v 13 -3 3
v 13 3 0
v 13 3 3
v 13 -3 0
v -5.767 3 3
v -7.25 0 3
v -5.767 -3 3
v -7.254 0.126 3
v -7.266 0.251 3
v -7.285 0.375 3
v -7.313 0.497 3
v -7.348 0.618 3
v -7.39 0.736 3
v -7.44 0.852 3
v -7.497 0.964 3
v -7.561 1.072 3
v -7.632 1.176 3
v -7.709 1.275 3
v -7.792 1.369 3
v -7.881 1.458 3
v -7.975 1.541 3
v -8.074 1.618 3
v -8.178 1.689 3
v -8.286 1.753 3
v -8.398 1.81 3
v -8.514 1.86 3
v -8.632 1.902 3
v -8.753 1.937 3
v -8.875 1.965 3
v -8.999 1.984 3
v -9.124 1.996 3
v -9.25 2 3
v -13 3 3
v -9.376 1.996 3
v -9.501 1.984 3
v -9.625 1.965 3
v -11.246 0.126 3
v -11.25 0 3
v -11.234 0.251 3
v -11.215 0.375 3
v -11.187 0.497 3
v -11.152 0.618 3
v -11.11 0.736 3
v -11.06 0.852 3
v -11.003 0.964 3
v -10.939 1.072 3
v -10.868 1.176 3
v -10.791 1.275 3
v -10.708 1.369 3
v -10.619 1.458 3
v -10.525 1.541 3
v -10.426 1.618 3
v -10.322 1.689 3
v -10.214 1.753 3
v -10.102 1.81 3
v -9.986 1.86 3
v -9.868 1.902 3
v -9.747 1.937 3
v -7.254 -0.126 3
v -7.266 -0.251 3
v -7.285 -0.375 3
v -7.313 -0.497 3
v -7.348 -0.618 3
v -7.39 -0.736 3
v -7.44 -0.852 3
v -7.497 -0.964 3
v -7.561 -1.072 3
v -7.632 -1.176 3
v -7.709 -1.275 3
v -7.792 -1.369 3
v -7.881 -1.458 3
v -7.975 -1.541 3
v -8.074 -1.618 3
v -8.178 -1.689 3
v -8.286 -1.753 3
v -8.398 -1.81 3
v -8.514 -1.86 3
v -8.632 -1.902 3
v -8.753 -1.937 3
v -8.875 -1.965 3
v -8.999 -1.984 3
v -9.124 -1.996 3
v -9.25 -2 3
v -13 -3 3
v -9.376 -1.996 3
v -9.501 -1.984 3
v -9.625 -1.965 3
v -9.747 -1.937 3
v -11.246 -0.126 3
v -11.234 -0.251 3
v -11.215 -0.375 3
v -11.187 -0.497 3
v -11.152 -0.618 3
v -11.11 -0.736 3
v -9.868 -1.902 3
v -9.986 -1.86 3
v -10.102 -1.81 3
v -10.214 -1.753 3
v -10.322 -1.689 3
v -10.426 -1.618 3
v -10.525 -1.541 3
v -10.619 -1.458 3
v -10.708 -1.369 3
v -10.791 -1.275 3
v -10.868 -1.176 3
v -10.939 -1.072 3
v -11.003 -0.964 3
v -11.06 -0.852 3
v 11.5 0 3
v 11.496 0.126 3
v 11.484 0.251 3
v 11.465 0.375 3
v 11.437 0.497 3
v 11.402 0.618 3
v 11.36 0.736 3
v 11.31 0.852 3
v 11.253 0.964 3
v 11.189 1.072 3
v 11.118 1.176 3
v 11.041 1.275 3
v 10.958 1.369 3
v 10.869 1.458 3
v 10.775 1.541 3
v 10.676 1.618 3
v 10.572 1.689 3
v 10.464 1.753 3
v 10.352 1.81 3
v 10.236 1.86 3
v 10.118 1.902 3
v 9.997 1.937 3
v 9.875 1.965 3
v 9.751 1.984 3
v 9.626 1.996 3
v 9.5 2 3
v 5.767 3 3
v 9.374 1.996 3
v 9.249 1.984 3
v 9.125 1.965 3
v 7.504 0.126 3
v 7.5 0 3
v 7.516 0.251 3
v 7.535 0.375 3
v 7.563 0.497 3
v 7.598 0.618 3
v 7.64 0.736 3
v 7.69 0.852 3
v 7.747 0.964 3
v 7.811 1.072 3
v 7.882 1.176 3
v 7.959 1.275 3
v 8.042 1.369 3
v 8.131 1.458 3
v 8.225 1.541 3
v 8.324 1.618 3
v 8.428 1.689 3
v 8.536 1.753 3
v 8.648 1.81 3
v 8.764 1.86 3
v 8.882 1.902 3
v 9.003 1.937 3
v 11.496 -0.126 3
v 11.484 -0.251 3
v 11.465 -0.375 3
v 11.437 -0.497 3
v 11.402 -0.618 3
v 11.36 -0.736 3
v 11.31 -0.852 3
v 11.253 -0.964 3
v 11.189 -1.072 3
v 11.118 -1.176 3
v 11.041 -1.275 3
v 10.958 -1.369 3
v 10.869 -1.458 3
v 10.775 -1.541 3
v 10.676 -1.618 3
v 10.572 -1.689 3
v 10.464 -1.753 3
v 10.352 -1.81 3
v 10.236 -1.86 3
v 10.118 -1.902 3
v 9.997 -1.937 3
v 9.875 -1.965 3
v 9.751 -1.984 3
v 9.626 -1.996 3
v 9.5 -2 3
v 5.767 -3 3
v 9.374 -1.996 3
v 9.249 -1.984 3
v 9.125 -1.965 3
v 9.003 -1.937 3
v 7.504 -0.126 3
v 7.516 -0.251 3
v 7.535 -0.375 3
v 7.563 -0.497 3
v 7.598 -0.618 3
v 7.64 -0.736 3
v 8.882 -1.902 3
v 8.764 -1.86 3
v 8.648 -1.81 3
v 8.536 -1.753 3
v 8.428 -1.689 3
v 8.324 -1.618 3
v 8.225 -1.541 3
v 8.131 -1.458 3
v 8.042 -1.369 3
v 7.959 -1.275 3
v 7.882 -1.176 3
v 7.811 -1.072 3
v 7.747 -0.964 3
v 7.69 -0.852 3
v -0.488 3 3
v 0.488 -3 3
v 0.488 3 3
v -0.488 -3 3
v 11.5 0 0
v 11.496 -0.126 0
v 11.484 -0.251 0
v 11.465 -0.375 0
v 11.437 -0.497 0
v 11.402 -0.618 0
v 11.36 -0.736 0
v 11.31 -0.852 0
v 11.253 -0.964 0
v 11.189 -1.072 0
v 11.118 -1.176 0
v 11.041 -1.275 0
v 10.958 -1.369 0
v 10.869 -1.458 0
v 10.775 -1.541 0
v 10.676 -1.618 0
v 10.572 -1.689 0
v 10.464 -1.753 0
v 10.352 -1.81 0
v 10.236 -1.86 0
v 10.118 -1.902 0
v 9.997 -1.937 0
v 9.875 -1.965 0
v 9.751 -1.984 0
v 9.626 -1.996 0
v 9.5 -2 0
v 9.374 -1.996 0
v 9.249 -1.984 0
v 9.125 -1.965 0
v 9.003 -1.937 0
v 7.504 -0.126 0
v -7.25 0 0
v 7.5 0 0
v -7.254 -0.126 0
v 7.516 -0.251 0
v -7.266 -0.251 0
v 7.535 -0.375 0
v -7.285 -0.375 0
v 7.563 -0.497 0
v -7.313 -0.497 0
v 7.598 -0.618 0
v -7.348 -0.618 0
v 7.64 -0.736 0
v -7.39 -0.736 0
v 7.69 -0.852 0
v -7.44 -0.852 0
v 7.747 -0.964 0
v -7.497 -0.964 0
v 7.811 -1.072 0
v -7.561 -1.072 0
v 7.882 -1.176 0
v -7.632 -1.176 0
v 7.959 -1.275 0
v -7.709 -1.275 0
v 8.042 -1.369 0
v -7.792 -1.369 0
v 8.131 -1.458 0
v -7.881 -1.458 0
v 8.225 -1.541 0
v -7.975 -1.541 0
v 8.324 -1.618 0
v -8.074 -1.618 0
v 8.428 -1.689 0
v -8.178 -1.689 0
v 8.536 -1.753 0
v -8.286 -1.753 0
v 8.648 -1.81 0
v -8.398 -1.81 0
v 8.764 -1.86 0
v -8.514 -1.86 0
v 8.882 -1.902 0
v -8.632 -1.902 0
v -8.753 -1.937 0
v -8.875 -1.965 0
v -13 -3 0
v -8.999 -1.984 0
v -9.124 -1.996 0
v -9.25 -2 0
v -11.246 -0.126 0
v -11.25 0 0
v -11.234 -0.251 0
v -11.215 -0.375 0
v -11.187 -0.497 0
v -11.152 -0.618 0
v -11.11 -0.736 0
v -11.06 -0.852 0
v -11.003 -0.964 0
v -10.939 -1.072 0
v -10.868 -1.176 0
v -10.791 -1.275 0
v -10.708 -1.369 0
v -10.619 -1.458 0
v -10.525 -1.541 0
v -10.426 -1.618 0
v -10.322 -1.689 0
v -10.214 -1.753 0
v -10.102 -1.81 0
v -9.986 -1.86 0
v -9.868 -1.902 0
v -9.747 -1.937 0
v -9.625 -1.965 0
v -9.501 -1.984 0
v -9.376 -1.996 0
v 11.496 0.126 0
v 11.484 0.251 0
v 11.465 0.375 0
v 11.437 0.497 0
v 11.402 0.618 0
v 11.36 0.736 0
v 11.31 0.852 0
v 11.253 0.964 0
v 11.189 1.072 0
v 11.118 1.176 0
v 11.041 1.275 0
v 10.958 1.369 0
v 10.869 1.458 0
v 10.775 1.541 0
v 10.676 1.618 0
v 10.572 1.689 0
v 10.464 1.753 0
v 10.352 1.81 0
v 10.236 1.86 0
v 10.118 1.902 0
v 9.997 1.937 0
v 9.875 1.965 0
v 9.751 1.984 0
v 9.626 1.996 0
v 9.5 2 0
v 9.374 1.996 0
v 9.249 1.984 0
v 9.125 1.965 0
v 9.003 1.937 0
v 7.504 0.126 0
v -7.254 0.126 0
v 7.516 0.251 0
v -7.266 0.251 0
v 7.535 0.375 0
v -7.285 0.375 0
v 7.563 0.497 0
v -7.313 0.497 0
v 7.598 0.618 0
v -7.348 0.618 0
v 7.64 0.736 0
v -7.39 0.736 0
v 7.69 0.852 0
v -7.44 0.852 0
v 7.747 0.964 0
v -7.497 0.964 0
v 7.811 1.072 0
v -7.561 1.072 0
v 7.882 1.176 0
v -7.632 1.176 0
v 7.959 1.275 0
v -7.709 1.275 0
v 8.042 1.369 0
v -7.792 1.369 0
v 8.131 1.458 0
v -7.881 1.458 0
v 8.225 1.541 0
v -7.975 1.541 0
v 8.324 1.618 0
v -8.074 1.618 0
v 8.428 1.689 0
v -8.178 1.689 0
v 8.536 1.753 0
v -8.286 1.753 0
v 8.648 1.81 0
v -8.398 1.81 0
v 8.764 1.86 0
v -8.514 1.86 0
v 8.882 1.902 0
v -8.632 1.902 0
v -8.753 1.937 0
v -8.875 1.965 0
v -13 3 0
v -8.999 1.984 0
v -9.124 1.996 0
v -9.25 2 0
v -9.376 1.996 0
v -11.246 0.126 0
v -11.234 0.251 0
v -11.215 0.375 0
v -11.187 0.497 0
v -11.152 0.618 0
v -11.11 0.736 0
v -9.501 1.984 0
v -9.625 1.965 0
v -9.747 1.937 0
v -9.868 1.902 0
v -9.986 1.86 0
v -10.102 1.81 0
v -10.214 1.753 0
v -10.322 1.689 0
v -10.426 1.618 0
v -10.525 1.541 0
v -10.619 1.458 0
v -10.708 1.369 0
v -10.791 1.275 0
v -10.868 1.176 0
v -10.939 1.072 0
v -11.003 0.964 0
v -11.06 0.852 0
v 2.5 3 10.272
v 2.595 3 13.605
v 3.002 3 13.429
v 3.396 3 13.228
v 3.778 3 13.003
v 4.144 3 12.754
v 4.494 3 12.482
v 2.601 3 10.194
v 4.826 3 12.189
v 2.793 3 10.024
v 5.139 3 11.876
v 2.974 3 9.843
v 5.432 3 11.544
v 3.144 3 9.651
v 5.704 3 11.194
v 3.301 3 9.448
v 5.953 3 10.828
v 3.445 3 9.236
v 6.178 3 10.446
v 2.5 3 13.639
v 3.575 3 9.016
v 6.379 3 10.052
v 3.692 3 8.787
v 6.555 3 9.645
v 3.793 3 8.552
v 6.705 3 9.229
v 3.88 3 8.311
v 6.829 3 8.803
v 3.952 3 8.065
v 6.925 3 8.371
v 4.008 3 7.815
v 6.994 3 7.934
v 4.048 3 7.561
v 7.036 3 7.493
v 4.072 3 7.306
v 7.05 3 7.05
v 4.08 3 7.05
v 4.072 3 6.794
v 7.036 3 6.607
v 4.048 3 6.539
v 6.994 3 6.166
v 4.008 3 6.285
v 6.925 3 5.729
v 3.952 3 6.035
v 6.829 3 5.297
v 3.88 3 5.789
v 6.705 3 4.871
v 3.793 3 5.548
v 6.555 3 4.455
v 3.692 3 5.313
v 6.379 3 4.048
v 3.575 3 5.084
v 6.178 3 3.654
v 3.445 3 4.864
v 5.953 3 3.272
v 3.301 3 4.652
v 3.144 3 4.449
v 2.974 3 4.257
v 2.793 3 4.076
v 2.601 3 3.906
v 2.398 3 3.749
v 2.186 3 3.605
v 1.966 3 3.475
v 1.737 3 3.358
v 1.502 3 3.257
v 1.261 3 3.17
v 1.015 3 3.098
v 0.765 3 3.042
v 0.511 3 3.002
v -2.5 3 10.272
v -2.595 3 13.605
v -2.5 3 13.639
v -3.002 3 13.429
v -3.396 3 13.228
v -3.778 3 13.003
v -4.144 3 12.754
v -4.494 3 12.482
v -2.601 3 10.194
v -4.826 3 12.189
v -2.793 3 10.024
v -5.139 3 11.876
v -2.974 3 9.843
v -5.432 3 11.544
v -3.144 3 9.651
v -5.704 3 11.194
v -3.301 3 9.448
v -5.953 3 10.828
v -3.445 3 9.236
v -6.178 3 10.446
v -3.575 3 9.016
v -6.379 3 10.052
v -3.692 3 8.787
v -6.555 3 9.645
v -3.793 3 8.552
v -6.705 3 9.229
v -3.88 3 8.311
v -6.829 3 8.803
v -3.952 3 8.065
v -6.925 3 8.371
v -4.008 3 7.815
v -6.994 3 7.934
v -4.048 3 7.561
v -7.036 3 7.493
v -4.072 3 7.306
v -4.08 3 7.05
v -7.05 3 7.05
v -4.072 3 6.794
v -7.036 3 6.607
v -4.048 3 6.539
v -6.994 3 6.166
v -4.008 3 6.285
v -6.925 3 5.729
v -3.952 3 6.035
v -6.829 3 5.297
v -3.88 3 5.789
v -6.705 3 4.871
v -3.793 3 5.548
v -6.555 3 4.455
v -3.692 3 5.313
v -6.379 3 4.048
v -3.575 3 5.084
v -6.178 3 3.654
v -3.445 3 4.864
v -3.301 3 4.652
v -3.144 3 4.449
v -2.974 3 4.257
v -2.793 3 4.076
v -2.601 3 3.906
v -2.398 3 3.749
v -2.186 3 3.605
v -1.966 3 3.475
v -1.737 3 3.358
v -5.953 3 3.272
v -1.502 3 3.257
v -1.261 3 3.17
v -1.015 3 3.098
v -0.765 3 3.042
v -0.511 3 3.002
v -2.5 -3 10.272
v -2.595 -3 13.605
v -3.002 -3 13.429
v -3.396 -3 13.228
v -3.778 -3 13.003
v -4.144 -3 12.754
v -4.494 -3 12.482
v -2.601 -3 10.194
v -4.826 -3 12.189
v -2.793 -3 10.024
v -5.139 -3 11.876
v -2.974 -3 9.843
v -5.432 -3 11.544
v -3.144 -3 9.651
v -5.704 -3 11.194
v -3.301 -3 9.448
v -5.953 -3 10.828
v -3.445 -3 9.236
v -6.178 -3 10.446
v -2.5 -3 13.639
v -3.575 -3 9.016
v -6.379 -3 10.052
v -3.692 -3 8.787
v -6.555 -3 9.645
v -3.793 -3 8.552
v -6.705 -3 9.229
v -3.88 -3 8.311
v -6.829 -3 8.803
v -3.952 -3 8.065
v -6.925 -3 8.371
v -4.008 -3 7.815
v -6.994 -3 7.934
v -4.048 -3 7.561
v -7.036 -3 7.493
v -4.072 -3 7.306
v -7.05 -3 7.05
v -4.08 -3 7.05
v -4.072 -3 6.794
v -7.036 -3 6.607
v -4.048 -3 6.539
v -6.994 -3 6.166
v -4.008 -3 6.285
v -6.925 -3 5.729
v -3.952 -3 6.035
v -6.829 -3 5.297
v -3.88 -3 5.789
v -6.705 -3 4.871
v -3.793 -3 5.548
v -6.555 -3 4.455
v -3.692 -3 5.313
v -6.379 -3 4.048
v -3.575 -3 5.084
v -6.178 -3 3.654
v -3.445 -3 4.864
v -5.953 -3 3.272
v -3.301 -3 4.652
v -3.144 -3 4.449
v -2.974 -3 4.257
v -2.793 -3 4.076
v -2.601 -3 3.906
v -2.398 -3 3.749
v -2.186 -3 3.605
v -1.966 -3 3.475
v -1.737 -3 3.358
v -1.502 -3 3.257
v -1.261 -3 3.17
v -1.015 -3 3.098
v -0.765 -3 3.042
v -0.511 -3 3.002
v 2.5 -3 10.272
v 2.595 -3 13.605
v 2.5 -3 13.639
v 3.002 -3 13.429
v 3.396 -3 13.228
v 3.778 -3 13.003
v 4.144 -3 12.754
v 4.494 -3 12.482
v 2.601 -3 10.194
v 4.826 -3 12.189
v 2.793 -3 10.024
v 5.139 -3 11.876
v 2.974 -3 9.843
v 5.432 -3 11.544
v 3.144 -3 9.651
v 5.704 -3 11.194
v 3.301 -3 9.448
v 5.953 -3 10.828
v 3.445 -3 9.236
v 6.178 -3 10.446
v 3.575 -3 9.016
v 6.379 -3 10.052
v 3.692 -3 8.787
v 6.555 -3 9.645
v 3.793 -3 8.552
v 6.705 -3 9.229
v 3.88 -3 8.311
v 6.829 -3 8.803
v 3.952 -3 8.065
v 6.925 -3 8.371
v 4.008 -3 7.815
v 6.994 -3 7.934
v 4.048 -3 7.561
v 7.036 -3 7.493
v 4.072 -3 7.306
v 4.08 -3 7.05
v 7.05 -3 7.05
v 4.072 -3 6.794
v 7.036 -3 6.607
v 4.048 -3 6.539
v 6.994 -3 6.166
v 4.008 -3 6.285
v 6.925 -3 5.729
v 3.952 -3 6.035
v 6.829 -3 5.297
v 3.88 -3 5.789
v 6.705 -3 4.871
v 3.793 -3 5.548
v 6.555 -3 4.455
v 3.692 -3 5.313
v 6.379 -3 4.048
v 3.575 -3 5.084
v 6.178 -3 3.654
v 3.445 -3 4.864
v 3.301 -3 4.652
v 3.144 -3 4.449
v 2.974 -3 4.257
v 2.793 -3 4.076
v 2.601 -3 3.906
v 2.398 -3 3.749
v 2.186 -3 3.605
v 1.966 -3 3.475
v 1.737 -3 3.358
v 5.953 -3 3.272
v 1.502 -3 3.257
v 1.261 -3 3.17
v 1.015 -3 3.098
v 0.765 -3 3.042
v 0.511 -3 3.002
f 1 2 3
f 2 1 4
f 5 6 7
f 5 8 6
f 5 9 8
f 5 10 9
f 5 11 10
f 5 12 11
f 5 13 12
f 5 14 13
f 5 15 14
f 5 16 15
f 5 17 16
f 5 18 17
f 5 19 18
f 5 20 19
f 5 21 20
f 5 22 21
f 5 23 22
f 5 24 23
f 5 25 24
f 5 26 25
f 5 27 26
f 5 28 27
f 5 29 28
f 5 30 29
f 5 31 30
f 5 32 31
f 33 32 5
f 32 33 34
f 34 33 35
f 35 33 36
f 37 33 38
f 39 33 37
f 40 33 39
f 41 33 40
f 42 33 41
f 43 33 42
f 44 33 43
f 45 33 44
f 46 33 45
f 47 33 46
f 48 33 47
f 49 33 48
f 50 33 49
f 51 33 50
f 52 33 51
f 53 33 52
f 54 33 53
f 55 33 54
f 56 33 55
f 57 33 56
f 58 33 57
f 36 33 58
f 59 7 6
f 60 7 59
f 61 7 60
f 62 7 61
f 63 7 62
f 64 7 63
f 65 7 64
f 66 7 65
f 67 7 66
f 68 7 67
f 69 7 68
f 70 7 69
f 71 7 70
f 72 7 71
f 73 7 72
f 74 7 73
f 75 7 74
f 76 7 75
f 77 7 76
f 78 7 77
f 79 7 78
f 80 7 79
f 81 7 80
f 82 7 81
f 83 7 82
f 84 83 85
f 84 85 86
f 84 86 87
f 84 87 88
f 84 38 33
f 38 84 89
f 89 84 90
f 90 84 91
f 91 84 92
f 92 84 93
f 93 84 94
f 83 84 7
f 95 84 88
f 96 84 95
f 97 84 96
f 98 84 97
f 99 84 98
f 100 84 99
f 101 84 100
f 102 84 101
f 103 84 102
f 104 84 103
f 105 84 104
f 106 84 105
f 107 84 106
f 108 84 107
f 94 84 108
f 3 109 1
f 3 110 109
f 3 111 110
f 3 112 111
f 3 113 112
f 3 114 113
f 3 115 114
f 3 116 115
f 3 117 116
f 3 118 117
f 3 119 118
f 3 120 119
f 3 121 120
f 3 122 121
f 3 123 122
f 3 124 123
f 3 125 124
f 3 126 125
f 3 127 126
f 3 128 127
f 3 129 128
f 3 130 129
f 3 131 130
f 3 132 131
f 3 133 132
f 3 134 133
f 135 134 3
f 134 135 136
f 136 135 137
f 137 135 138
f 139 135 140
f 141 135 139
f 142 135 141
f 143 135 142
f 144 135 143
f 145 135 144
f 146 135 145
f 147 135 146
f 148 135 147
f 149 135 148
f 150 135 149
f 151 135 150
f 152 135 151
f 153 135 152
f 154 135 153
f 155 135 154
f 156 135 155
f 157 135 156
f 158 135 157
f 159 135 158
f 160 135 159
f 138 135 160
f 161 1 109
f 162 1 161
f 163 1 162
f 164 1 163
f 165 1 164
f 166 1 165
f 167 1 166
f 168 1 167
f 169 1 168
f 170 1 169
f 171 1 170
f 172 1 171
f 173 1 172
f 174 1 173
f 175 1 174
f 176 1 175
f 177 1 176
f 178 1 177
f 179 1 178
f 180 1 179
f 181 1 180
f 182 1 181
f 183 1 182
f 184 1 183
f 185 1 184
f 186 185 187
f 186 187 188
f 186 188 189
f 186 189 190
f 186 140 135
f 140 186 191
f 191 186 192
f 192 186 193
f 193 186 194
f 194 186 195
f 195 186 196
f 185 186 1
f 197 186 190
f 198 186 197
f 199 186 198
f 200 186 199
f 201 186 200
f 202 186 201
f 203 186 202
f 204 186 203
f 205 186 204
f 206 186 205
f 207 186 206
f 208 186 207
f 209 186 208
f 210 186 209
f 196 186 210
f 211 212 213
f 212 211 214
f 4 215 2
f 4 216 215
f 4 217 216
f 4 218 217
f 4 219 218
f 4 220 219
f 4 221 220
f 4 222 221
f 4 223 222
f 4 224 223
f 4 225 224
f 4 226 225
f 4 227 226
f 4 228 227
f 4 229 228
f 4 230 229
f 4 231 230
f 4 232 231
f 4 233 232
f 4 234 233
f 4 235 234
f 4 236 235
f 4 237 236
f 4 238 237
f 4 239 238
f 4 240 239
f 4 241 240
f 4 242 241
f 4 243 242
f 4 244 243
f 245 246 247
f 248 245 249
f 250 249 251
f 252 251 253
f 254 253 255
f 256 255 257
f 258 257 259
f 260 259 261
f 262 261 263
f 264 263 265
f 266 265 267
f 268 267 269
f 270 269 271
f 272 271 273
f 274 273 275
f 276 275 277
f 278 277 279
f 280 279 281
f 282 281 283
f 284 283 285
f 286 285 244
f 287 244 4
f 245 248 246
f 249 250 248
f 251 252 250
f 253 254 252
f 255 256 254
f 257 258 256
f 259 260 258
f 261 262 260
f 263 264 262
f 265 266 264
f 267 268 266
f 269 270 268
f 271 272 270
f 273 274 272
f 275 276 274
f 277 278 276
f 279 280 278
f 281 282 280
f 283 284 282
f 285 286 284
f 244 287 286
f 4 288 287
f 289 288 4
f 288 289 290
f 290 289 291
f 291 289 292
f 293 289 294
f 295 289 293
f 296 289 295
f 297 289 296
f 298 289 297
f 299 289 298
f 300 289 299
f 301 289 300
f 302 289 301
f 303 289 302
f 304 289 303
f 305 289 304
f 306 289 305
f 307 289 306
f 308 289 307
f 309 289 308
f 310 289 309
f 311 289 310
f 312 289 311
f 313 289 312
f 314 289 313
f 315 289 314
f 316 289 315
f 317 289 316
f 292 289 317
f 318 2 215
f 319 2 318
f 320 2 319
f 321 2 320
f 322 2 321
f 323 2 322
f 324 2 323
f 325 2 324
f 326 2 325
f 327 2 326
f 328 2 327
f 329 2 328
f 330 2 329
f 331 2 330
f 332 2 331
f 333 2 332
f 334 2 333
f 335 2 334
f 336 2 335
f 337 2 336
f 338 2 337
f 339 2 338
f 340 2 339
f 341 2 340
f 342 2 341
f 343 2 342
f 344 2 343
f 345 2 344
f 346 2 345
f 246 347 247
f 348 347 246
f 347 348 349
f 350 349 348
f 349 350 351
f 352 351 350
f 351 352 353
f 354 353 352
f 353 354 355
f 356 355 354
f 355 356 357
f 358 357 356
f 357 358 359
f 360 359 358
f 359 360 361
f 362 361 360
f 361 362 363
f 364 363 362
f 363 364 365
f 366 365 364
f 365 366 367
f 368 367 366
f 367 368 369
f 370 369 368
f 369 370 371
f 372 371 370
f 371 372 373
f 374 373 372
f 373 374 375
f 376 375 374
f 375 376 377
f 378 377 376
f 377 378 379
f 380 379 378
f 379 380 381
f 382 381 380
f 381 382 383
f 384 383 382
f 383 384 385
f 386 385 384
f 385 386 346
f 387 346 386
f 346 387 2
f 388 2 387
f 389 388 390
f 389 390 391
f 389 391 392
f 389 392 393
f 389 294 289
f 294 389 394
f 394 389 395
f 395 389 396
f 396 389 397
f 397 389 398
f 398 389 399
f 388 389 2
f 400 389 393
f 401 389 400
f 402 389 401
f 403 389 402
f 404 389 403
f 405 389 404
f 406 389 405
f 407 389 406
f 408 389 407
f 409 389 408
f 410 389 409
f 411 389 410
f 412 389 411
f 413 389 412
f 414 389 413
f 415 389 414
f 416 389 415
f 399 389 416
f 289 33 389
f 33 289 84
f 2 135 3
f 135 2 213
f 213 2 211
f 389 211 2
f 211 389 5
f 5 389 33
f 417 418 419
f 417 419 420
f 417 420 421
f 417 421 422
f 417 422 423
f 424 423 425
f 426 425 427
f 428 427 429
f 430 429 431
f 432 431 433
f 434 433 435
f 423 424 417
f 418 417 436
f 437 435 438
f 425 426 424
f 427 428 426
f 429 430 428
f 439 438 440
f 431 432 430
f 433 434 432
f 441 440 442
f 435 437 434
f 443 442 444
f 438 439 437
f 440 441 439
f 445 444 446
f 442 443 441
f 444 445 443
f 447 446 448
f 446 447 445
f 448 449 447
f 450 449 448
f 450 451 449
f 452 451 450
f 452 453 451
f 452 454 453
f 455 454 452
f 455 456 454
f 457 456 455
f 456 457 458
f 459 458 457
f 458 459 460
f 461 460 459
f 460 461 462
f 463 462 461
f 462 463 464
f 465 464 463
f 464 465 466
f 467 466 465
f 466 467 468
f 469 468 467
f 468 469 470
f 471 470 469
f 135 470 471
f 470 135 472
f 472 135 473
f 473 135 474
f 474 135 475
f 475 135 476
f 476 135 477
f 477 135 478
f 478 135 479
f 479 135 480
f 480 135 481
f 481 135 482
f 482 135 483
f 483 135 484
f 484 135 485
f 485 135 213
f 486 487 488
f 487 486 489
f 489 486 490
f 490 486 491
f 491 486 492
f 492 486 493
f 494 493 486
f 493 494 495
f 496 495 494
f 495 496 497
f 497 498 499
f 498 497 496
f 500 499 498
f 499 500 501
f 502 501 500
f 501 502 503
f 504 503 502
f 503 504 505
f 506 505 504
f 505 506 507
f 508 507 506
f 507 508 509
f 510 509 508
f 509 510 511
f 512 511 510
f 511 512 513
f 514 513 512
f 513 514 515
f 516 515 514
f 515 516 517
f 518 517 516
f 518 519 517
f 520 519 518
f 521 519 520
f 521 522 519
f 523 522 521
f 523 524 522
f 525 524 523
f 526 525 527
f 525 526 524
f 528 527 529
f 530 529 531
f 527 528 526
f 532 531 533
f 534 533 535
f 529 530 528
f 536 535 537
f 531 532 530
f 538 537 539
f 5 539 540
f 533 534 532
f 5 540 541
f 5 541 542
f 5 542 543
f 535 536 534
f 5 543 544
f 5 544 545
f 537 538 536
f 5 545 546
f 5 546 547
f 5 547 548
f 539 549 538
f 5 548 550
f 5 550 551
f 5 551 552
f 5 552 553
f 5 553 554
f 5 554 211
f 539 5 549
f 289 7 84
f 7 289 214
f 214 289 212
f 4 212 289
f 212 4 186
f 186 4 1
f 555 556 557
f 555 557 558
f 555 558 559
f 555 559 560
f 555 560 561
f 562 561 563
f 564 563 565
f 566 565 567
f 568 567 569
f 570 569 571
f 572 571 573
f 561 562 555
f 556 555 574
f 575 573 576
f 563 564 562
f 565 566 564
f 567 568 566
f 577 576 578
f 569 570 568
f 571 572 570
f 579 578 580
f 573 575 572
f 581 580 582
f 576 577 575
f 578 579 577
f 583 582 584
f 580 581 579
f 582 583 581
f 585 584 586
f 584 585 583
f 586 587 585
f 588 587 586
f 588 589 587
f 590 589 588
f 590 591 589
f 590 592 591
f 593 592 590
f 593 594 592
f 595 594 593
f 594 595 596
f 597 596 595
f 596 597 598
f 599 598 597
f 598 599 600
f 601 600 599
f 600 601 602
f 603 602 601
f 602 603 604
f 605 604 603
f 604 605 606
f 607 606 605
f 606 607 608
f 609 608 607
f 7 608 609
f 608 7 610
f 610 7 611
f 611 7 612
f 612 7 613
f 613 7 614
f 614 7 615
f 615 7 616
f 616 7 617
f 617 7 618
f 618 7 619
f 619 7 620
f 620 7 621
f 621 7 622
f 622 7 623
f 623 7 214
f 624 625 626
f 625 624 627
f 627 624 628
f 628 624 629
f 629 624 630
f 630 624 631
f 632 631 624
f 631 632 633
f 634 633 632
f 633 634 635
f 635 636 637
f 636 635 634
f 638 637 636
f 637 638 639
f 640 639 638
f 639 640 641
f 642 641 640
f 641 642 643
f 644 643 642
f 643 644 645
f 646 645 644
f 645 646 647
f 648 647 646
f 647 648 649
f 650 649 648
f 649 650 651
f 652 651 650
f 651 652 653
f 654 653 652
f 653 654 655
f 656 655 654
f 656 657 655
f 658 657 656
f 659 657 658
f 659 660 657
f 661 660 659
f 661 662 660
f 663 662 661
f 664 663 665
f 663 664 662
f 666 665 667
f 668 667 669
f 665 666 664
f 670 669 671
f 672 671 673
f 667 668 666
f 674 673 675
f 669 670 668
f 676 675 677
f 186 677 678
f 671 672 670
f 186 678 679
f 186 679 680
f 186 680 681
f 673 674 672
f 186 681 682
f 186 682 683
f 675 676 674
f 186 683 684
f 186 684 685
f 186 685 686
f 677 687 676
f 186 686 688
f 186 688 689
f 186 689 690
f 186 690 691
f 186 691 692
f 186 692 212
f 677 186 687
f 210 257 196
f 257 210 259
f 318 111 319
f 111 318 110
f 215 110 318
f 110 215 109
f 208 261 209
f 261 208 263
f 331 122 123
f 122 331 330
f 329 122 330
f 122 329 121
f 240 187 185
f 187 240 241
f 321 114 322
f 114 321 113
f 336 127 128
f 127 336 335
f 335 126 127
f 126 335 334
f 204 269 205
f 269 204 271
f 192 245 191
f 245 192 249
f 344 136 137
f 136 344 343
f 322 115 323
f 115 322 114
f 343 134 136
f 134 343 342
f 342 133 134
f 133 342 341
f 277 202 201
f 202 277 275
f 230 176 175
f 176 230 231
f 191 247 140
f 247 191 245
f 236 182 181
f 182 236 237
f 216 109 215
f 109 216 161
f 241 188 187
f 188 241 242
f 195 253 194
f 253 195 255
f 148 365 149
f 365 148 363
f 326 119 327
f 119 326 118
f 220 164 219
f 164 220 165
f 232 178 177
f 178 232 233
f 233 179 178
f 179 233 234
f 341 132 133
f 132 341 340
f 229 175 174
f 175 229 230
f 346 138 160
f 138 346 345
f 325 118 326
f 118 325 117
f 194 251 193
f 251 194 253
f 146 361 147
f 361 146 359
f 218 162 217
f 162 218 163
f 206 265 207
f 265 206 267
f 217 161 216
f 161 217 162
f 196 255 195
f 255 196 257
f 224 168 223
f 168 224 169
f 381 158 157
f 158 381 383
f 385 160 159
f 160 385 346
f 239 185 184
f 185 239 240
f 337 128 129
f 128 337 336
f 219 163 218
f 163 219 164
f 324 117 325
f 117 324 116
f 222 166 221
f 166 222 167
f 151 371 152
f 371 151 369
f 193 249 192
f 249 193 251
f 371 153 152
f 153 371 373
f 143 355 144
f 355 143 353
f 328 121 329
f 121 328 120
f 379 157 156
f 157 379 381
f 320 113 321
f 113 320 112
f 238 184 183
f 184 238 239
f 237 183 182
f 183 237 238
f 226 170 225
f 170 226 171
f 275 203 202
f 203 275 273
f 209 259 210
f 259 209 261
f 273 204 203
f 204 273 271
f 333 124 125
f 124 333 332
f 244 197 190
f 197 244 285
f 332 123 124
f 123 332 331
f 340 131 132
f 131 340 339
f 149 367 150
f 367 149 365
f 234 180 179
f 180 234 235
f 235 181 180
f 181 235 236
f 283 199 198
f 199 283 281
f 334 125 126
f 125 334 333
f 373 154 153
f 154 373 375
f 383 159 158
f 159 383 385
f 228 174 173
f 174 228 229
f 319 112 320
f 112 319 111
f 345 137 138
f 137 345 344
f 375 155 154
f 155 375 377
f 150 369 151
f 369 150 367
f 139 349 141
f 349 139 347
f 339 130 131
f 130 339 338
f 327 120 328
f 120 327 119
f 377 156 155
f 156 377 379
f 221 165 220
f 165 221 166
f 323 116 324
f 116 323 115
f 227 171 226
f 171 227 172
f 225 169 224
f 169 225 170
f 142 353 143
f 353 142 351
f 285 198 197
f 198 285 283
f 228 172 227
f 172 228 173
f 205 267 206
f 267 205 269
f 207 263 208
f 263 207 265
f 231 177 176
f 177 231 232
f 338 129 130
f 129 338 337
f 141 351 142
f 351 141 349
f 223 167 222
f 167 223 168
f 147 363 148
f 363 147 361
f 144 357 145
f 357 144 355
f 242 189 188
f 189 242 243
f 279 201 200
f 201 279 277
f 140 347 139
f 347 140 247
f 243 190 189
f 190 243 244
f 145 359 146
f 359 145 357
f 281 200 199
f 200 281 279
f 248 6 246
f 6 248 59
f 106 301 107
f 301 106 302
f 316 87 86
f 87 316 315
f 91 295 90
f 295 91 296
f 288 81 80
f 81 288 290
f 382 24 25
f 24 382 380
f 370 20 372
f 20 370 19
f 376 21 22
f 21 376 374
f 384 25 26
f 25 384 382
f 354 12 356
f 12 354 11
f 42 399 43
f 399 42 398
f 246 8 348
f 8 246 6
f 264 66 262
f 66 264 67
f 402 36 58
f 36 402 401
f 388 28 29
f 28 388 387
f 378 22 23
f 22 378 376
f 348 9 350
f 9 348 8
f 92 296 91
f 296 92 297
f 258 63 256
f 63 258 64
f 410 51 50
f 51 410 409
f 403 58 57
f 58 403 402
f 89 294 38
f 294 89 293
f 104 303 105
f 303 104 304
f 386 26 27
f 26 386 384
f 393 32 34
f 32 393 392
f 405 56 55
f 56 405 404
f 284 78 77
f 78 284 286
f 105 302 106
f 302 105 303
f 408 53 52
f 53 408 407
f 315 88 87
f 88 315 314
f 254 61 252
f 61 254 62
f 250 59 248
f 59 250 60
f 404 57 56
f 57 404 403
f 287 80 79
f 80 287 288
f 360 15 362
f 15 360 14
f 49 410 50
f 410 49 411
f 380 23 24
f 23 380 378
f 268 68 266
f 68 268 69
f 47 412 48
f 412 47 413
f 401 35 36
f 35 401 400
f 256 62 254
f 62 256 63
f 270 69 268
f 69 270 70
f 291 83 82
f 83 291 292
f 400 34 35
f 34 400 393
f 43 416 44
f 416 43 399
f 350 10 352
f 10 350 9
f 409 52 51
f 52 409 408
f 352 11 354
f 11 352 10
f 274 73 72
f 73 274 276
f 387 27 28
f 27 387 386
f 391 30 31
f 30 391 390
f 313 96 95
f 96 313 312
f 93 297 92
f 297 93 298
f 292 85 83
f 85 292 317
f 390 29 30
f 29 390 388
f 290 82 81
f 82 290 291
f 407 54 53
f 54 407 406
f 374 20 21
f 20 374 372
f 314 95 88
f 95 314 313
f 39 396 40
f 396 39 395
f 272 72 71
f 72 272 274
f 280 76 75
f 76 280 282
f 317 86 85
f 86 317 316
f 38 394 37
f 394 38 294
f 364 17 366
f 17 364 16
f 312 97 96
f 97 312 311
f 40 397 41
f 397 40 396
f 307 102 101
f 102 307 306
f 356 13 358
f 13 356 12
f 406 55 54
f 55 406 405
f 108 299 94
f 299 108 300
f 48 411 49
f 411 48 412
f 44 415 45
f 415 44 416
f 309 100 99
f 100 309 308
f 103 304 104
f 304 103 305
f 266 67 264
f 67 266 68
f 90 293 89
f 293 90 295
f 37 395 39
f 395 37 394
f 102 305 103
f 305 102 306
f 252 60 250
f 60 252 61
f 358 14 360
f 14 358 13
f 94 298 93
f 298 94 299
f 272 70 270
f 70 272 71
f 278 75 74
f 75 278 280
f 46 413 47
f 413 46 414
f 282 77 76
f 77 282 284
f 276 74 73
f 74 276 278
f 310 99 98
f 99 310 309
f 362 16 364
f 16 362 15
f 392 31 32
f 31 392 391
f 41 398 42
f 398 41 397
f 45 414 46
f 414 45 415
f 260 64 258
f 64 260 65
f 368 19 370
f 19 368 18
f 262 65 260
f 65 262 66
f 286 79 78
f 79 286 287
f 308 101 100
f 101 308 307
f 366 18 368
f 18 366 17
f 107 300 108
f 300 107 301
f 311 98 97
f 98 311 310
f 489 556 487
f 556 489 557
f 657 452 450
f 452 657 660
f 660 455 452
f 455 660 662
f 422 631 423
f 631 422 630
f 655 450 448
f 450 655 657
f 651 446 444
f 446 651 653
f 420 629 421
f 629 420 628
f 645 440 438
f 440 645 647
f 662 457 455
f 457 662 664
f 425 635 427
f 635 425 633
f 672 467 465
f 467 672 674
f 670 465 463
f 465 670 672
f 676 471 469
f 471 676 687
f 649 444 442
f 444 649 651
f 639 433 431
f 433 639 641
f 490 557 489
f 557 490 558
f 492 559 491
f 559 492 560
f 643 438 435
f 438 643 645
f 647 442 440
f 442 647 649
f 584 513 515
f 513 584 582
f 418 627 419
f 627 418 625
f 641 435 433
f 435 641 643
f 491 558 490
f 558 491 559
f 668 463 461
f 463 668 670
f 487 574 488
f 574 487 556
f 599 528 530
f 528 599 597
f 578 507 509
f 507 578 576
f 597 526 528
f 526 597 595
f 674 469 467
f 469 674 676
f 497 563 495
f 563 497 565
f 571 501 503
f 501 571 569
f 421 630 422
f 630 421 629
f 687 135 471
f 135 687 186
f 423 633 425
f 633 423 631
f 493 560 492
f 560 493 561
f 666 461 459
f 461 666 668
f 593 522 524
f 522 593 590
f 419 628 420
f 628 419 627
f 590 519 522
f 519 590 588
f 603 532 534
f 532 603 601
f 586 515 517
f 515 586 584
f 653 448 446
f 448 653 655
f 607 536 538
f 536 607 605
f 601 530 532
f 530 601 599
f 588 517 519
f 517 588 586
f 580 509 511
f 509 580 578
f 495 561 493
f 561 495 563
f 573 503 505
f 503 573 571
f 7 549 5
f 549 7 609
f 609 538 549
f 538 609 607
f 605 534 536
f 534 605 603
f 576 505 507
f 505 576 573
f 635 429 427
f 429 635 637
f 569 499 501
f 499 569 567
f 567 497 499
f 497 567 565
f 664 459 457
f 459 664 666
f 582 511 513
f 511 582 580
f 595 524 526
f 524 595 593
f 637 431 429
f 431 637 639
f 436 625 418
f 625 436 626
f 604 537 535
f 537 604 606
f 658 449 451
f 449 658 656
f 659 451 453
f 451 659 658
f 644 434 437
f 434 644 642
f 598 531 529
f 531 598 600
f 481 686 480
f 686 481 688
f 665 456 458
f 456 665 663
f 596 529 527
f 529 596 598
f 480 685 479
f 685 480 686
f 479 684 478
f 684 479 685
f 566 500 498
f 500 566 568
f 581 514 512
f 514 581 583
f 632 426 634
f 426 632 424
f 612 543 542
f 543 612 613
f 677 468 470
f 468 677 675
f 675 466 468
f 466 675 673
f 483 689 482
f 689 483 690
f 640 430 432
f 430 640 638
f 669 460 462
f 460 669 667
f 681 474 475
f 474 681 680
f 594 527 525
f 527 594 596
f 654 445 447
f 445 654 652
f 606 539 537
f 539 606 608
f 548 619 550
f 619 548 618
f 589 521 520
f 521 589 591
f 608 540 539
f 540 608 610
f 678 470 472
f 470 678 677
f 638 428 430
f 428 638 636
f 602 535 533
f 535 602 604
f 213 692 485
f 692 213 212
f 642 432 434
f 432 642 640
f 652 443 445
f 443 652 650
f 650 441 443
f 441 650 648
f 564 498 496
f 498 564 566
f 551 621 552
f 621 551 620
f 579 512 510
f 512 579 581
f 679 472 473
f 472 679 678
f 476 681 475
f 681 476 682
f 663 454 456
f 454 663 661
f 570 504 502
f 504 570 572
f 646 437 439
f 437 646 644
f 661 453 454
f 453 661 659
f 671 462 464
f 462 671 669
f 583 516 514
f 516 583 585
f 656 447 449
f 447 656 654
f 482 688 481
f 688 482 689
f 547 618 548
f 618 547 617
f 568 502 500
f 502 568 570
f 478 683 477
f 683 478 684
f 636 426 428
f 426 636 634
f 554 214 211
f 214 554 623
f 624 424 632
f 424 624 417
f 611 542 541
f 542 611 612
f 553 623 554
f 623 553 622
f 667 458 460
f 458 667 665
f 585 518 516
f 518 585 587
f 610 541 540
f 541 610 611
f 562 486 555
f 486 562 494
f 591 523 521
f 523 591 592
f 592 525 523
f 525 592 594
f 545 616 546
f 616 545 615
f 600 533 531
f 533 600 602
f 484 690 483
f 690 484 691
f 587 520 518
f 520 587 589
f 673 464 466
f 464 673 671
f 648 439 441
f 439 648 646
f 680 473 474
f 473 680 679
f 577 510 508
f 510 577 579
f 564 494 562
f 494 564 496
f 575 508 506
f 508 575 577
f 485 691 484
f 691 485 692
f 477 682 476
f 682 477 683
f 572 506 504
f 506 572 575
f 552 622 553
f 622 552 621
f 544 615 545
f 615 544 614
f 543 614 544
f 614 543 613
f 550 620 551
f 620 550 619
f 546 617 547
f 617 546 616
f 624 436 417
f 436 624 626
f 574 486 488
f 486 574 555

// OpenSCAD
//---------------------------------------------------------------
//--  Eje X final de carrera.  (c) Antonio Castro Gómez
//---------------------------------------------------------------
//-- Released under the GPL license
//---------------------------------------------------------------


difference()
{
	translate([0,0,1.5])cube(size=[26,6,3], center=true);
	//translate([0,0,1])cube(size=[13,9,4], center=true);

	translate([9.5,0,-1])cylinder(h=10, r=2, $fn=100);

	translate([-9.25,0,-1])cylinder(h=10, r=2, $fn=100);
}
difference()
{

  translate([0,3,7.05])rotate([90,0,0])cylinder(h=6, r=7.05, $fn=100);
  translate([0,5,7.05])rotate([90,0,0])cylinder(h=10, r=4.08, $fn=100);
  translate([0,0,11])cube(size=[5,8,10], center=true);	
}
